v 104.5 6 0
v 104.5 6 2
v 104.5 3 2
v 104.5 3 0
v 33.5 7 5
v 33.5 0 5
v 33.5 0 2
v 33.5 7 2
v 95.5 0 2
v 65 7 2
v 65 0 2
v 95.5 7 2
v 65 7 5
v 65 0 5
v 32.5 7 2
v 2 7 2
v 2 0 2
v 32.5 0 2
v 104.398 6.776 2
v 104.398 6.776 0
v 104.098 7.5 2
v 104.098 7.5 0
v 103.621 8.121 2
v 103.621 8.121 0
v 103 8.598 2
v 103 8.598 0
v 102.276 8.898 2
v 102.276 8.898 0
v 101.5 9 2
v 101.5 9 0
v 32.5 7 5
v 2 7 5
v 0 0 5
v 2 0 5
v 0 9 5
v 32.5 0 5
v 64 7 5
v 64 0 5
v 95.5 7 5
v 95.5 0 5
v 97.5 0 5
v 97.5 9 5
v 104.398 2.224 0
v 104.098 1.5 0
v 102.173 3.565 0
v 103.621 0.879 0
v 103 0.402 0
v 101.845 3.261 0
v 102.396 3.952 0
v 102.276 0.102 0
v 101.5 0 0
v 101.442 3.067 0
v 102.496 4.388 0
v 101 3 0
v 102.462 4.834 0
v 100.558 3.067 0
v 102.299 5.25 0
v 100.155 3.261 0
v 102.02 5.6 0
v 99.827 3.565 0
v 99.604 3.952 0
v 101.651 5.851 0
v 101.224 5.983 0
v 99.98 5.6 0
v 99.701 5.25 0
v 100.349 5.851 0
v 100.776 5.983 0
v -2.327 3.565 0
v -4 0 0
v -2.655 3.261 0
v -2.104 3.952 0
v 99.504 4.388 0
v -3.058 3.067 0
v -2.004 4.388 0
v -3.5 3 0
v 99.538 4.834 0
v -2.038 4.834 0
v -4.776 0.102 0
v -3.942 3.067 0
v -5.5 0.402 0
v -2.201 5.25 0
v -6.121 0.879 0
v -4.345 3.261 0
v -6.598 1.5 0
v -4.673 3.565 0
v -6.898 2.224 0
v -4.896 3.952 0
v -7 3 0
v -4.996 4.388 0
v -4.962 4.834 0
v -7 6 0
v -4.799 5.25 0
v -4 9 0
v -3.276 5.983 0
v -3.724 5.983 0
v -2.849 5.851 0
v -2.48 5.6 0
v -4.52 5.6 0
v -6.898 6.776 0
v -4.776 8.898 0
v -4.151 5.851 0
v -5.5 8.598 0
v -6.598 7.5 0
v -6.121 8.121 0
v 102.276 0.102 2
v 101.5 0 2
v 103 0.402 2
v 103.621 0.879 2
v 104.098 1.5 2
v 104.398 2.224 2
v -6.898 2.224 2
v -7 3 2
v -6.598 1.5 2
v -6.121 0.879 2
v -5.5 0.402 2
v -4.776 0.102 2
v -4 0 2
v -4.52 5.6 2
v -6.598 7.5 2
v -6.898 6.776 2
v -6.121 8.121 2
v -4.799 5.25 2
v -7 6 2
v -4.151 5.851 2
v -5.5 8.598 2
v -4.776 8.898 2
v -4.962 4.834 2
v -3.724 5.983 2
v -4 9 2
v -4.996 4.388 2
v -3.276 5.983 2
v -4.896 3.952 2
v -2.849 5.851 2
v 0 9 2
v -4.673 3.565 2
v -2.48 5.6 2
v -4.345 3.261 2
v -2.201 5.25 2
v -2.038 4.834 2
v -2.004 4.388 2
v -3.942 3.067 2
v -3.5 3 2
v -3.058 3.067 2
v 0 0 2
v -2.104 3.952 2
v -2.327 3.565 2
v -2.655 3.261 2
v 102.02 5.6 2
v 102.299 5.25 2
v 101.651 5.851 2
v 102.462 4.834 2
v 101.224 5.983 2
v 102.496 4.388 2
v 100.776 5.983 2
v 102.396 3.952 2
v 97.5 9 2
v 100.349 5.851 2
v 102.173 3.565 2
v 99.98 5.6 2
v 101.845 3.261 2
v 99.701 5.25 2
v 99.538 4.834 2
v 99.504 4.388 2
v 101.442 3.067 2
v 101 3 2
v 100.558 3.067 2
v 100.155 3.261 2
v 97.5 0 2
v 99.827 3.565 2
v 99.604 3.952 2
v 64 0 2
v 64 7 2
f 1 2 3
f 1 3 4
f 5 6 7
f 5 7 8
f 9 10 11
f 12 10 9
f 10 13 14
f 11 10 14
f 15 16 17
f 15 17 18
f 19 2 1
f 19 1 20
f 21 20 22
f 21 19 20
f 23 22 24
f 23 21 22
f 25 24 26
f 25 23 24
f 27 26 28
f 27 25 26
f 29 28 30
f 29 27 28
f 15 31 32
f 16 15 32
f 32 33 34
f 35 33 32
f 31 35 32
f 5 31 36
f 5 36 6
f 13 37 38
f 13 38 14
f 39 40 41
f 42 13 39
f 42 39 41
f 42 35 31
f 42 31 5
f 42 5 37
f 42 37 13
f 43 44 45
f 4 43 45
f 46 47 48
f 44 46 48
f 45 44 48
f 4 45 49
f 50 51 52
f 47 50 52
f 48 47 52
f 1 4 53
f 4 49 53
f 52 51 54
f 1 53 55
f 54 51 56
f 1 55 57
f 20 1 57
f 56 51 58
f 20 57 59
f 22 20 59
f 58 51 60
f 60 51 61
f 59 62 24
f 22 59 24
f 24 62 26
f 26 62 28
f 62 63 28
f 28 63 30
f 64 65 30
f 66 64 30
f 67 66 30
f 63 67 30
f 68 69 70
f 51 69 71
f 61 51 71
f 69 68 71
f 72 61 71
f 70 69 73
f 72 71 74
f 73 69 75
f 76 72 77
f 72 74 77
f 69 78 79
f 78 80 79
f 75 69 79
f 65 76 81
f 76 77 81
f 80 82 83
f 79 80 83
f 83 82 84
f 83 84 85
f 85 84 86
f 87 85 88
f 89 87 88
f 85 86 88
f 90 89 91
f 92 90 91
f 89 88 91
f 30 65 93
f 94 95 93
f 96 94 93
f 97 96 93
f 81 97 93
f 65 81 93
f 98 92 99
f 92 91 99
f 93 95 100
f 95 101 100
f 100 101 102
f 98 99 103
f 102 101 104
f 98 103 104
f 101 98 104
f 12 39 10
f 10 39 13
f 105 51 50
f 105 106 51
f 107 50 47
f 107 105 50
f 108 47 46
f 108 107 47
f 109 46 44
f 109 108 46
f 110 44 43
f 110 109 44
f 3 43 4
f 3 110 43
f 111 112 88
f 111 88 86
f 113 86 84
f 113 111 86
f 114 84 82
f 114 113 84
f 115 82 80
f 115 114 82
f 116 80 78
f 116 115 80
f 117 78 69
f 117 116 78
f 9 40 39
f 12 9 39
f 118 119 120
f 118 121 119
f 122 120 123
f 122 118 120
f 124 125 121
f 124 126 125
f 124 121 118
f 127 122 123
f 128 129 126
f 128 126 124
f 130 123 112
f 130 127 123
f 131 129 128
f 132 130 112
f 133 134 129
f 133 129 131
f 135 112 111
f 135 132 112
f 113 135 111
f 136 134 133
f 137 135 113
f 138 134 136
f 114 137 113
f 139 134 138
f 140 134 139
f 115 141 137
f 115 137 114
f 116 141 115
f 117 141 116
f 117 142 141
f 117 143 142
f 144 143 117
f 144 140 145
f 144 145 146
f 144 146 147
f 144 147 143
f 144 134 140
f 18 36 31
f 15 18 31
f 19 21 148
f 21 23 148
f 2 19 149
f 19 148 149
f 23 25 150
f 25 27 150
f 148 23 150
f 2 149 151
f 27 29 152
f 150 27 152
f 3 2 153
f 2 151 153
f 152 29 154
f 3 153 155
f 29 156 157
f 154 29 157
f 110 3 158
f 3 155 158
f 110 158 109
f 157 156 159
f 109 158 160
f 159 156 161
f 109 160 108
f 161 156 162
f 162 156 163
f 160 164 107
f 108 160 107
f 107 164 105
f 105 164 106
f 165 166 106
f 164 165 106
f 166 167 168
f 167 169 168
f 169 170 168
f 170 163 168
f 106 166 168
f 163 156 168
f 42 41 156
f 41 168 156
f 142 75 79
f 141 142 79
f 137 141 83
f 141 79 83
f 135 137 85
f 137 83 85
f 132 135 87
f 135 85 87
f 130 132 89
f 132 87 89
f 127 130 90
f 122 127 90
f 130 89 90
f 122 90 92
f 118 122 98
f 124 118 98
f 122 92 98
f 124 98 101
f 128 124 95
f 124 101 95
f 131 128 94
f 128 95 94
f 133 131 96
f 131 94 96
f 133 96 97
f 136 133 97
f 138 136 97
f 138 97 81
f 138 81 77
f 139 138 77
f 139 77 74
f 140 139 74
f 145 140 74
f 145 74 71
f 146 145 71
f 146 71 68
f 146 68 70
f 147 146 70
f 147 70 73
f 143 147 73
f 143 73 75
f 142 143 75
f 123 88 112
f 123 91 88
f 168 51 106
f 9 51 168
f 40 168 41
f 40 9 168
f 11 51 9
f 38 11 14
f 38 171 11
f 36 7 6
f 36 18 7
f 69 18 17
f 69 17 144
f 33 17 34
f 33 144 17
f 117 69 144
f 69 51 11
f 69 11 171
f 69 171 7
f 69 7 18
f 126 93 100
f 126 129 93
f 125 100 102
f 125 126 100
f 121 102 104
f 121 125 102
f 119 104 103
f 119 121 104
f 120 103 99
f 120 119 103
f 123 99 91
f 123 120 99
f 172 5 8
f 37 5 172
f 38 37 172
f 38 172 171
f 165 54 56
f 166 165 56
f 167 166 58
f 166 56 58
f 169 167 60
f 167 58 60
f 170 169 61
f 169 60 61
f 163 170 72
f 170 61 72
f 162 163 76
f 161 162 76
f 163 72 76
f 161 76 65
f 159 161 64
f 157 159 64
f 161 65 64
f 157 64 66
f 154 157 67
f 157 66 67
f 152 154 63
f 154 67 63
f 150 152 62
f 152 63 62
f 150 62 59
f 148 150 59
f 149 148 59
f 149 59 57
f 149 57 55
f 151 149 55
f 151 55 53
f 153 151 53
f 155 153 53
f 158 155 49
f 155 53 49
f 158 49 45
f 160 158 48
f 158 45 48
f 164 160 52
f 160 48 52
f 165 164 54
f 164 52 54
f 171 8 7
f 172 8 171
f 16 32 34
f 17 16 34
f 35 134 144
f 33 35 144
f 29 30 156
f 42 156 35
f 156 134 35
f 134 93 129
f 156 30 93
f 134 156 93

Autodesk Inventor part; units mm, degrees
ref_plane "YZ Plane" through (0, 0, 0) normal (1, 0, 0) x (0, 1, 0)
ref_plane "XZ Plane" through (0, 0, 0) normal (0, 1, 0) x (-1, 0, 0)
ref_plane "XY Plane" through (0, 0, 0) normal (0, 0, 1) x (1, 0, 0)
sketch "Sketch1" plane through (0, 0, 0) normal (0, 0, 1) x (1, 0, 0)
  line L0 (0, 0) -> (97.5, 0)
  line L1 (97.5, 0) -> (97.5, 9)
  line L2 (97.5, 9) -> (0, 9)
  line L3 (0, 9) -> (0, 0)
  dimension "d2" = 97.5
  dimension "d3" = 9
extrude "Extrusion1" add sketch "Sketch1" along normal blind 5
sketch "Sketch2" plane through (0, 0, 5) normal (0, 0, 1) x (1, 0, 0)
  line L0 (0, 0) -> (97.5, 0) projected
  line L1 (97.5, 0) -> (97.5, 9) projected
  line L2 (0, 9) -> (0, 0) projected
  line L3 (2, 0) -> (32.5, 0)
  line L4 (32.5, 0) -> (32.5, 7)
  line L5 (32.5, 7) -> (2, 7)
  line L6 (2, 7) -> (2, 0)
  line L7 (33.5, 7) -> (64, 7)
  line L8 (64, 7) -> (64, 0)
  line L9 (64, 0) -> (33.5, 0)
  line L10 (33.5, 0) -> (33.5, 7)
  line L11 (65, 0) -> (95.5, 0)
  line L12 (95.5, 0) -> (95.5, 7)
  line L13 (95.5, 7) -> (65, 7)
  line L14 (65, 7) -> (65, 0)
  dimension "d4" = 7
  dimension "d5" = 30.5
  dimension "d6" = 2
  dimension "d7" = 2
  dimension "d8" = 30.5
  dimension "d9" = 30.5
  dimension "d10" = 1
extrude "Extrusion2" cut sketch "Sketch2" against normal blind 3
sketch "Sketch3" plane through (0, 0, 0) normal (-1, 0, 0) x (0, 0, 1)
  line L0 (0, 9) -> (0, 0) projected
  line L1 (0, 0) -> (5, 0) projected
  line L2 (0, 9) -> (2, 9)
  line L3 (2, 9) -> (2, 0)
  line L4 (2, 0) -> (0, 0)
  line L5 (0, 0) -> (0, 9)
  dimension "d13" = 2
extrude "Extrusion3" add sketch "Sketch3" along normal blind 7
sketch "Sketch5" plane through (97.5, 0, 0) normal (1, 0, 0) x (0, 0, -1)
  line L0 (0, 0) -> (-5, 0) projected
  line L1 (0, 9) -> (-2, 9)
  line L2 (-2, 9) -> (-2, 0)
  line L3 (-2, 0) -> (0, 0)
  line L4 (0, 0) -> (0, 9)
  dimension "d22" = 2
extrude "Extrusion5" add sketch "Sketch5" along normal blind 7
sketch "Sketch7" plane through (0, 0, 2) normal (0, 0, 1) x (1, 0, 0)
  line L0 (-7, 0) -> (-7, 9) projected
  line L1 (97.5, 0) -> (97.5, 9) projected
  line L2 (97.5, 0) -> (104.5, 0) projected
  line L3 (104.5, 9) -> (104.5, 0) projected
  line L4 (97.5, 9) -> (104.5, 9) projected
  point P0 (-3.5, 4.5)
  point P1 (101, 4.5)
  dimension "d31" = 3.5
  dimension "d32" = 4.5
  dimension "d33" = 3.5
hole "Hole1" at (-3.5, 4.5, 2) at (101, 4.5, 2) direction (0, 0, -1) diameter 3 end through all
fillet "Fillet1" radius 3 4 edges at (104.5, 0, 1) (104.5, 9, 1) (-7, 0, 1) (-7, 9, 1)
properties part number "base_corner" material "ABS Plastic"
